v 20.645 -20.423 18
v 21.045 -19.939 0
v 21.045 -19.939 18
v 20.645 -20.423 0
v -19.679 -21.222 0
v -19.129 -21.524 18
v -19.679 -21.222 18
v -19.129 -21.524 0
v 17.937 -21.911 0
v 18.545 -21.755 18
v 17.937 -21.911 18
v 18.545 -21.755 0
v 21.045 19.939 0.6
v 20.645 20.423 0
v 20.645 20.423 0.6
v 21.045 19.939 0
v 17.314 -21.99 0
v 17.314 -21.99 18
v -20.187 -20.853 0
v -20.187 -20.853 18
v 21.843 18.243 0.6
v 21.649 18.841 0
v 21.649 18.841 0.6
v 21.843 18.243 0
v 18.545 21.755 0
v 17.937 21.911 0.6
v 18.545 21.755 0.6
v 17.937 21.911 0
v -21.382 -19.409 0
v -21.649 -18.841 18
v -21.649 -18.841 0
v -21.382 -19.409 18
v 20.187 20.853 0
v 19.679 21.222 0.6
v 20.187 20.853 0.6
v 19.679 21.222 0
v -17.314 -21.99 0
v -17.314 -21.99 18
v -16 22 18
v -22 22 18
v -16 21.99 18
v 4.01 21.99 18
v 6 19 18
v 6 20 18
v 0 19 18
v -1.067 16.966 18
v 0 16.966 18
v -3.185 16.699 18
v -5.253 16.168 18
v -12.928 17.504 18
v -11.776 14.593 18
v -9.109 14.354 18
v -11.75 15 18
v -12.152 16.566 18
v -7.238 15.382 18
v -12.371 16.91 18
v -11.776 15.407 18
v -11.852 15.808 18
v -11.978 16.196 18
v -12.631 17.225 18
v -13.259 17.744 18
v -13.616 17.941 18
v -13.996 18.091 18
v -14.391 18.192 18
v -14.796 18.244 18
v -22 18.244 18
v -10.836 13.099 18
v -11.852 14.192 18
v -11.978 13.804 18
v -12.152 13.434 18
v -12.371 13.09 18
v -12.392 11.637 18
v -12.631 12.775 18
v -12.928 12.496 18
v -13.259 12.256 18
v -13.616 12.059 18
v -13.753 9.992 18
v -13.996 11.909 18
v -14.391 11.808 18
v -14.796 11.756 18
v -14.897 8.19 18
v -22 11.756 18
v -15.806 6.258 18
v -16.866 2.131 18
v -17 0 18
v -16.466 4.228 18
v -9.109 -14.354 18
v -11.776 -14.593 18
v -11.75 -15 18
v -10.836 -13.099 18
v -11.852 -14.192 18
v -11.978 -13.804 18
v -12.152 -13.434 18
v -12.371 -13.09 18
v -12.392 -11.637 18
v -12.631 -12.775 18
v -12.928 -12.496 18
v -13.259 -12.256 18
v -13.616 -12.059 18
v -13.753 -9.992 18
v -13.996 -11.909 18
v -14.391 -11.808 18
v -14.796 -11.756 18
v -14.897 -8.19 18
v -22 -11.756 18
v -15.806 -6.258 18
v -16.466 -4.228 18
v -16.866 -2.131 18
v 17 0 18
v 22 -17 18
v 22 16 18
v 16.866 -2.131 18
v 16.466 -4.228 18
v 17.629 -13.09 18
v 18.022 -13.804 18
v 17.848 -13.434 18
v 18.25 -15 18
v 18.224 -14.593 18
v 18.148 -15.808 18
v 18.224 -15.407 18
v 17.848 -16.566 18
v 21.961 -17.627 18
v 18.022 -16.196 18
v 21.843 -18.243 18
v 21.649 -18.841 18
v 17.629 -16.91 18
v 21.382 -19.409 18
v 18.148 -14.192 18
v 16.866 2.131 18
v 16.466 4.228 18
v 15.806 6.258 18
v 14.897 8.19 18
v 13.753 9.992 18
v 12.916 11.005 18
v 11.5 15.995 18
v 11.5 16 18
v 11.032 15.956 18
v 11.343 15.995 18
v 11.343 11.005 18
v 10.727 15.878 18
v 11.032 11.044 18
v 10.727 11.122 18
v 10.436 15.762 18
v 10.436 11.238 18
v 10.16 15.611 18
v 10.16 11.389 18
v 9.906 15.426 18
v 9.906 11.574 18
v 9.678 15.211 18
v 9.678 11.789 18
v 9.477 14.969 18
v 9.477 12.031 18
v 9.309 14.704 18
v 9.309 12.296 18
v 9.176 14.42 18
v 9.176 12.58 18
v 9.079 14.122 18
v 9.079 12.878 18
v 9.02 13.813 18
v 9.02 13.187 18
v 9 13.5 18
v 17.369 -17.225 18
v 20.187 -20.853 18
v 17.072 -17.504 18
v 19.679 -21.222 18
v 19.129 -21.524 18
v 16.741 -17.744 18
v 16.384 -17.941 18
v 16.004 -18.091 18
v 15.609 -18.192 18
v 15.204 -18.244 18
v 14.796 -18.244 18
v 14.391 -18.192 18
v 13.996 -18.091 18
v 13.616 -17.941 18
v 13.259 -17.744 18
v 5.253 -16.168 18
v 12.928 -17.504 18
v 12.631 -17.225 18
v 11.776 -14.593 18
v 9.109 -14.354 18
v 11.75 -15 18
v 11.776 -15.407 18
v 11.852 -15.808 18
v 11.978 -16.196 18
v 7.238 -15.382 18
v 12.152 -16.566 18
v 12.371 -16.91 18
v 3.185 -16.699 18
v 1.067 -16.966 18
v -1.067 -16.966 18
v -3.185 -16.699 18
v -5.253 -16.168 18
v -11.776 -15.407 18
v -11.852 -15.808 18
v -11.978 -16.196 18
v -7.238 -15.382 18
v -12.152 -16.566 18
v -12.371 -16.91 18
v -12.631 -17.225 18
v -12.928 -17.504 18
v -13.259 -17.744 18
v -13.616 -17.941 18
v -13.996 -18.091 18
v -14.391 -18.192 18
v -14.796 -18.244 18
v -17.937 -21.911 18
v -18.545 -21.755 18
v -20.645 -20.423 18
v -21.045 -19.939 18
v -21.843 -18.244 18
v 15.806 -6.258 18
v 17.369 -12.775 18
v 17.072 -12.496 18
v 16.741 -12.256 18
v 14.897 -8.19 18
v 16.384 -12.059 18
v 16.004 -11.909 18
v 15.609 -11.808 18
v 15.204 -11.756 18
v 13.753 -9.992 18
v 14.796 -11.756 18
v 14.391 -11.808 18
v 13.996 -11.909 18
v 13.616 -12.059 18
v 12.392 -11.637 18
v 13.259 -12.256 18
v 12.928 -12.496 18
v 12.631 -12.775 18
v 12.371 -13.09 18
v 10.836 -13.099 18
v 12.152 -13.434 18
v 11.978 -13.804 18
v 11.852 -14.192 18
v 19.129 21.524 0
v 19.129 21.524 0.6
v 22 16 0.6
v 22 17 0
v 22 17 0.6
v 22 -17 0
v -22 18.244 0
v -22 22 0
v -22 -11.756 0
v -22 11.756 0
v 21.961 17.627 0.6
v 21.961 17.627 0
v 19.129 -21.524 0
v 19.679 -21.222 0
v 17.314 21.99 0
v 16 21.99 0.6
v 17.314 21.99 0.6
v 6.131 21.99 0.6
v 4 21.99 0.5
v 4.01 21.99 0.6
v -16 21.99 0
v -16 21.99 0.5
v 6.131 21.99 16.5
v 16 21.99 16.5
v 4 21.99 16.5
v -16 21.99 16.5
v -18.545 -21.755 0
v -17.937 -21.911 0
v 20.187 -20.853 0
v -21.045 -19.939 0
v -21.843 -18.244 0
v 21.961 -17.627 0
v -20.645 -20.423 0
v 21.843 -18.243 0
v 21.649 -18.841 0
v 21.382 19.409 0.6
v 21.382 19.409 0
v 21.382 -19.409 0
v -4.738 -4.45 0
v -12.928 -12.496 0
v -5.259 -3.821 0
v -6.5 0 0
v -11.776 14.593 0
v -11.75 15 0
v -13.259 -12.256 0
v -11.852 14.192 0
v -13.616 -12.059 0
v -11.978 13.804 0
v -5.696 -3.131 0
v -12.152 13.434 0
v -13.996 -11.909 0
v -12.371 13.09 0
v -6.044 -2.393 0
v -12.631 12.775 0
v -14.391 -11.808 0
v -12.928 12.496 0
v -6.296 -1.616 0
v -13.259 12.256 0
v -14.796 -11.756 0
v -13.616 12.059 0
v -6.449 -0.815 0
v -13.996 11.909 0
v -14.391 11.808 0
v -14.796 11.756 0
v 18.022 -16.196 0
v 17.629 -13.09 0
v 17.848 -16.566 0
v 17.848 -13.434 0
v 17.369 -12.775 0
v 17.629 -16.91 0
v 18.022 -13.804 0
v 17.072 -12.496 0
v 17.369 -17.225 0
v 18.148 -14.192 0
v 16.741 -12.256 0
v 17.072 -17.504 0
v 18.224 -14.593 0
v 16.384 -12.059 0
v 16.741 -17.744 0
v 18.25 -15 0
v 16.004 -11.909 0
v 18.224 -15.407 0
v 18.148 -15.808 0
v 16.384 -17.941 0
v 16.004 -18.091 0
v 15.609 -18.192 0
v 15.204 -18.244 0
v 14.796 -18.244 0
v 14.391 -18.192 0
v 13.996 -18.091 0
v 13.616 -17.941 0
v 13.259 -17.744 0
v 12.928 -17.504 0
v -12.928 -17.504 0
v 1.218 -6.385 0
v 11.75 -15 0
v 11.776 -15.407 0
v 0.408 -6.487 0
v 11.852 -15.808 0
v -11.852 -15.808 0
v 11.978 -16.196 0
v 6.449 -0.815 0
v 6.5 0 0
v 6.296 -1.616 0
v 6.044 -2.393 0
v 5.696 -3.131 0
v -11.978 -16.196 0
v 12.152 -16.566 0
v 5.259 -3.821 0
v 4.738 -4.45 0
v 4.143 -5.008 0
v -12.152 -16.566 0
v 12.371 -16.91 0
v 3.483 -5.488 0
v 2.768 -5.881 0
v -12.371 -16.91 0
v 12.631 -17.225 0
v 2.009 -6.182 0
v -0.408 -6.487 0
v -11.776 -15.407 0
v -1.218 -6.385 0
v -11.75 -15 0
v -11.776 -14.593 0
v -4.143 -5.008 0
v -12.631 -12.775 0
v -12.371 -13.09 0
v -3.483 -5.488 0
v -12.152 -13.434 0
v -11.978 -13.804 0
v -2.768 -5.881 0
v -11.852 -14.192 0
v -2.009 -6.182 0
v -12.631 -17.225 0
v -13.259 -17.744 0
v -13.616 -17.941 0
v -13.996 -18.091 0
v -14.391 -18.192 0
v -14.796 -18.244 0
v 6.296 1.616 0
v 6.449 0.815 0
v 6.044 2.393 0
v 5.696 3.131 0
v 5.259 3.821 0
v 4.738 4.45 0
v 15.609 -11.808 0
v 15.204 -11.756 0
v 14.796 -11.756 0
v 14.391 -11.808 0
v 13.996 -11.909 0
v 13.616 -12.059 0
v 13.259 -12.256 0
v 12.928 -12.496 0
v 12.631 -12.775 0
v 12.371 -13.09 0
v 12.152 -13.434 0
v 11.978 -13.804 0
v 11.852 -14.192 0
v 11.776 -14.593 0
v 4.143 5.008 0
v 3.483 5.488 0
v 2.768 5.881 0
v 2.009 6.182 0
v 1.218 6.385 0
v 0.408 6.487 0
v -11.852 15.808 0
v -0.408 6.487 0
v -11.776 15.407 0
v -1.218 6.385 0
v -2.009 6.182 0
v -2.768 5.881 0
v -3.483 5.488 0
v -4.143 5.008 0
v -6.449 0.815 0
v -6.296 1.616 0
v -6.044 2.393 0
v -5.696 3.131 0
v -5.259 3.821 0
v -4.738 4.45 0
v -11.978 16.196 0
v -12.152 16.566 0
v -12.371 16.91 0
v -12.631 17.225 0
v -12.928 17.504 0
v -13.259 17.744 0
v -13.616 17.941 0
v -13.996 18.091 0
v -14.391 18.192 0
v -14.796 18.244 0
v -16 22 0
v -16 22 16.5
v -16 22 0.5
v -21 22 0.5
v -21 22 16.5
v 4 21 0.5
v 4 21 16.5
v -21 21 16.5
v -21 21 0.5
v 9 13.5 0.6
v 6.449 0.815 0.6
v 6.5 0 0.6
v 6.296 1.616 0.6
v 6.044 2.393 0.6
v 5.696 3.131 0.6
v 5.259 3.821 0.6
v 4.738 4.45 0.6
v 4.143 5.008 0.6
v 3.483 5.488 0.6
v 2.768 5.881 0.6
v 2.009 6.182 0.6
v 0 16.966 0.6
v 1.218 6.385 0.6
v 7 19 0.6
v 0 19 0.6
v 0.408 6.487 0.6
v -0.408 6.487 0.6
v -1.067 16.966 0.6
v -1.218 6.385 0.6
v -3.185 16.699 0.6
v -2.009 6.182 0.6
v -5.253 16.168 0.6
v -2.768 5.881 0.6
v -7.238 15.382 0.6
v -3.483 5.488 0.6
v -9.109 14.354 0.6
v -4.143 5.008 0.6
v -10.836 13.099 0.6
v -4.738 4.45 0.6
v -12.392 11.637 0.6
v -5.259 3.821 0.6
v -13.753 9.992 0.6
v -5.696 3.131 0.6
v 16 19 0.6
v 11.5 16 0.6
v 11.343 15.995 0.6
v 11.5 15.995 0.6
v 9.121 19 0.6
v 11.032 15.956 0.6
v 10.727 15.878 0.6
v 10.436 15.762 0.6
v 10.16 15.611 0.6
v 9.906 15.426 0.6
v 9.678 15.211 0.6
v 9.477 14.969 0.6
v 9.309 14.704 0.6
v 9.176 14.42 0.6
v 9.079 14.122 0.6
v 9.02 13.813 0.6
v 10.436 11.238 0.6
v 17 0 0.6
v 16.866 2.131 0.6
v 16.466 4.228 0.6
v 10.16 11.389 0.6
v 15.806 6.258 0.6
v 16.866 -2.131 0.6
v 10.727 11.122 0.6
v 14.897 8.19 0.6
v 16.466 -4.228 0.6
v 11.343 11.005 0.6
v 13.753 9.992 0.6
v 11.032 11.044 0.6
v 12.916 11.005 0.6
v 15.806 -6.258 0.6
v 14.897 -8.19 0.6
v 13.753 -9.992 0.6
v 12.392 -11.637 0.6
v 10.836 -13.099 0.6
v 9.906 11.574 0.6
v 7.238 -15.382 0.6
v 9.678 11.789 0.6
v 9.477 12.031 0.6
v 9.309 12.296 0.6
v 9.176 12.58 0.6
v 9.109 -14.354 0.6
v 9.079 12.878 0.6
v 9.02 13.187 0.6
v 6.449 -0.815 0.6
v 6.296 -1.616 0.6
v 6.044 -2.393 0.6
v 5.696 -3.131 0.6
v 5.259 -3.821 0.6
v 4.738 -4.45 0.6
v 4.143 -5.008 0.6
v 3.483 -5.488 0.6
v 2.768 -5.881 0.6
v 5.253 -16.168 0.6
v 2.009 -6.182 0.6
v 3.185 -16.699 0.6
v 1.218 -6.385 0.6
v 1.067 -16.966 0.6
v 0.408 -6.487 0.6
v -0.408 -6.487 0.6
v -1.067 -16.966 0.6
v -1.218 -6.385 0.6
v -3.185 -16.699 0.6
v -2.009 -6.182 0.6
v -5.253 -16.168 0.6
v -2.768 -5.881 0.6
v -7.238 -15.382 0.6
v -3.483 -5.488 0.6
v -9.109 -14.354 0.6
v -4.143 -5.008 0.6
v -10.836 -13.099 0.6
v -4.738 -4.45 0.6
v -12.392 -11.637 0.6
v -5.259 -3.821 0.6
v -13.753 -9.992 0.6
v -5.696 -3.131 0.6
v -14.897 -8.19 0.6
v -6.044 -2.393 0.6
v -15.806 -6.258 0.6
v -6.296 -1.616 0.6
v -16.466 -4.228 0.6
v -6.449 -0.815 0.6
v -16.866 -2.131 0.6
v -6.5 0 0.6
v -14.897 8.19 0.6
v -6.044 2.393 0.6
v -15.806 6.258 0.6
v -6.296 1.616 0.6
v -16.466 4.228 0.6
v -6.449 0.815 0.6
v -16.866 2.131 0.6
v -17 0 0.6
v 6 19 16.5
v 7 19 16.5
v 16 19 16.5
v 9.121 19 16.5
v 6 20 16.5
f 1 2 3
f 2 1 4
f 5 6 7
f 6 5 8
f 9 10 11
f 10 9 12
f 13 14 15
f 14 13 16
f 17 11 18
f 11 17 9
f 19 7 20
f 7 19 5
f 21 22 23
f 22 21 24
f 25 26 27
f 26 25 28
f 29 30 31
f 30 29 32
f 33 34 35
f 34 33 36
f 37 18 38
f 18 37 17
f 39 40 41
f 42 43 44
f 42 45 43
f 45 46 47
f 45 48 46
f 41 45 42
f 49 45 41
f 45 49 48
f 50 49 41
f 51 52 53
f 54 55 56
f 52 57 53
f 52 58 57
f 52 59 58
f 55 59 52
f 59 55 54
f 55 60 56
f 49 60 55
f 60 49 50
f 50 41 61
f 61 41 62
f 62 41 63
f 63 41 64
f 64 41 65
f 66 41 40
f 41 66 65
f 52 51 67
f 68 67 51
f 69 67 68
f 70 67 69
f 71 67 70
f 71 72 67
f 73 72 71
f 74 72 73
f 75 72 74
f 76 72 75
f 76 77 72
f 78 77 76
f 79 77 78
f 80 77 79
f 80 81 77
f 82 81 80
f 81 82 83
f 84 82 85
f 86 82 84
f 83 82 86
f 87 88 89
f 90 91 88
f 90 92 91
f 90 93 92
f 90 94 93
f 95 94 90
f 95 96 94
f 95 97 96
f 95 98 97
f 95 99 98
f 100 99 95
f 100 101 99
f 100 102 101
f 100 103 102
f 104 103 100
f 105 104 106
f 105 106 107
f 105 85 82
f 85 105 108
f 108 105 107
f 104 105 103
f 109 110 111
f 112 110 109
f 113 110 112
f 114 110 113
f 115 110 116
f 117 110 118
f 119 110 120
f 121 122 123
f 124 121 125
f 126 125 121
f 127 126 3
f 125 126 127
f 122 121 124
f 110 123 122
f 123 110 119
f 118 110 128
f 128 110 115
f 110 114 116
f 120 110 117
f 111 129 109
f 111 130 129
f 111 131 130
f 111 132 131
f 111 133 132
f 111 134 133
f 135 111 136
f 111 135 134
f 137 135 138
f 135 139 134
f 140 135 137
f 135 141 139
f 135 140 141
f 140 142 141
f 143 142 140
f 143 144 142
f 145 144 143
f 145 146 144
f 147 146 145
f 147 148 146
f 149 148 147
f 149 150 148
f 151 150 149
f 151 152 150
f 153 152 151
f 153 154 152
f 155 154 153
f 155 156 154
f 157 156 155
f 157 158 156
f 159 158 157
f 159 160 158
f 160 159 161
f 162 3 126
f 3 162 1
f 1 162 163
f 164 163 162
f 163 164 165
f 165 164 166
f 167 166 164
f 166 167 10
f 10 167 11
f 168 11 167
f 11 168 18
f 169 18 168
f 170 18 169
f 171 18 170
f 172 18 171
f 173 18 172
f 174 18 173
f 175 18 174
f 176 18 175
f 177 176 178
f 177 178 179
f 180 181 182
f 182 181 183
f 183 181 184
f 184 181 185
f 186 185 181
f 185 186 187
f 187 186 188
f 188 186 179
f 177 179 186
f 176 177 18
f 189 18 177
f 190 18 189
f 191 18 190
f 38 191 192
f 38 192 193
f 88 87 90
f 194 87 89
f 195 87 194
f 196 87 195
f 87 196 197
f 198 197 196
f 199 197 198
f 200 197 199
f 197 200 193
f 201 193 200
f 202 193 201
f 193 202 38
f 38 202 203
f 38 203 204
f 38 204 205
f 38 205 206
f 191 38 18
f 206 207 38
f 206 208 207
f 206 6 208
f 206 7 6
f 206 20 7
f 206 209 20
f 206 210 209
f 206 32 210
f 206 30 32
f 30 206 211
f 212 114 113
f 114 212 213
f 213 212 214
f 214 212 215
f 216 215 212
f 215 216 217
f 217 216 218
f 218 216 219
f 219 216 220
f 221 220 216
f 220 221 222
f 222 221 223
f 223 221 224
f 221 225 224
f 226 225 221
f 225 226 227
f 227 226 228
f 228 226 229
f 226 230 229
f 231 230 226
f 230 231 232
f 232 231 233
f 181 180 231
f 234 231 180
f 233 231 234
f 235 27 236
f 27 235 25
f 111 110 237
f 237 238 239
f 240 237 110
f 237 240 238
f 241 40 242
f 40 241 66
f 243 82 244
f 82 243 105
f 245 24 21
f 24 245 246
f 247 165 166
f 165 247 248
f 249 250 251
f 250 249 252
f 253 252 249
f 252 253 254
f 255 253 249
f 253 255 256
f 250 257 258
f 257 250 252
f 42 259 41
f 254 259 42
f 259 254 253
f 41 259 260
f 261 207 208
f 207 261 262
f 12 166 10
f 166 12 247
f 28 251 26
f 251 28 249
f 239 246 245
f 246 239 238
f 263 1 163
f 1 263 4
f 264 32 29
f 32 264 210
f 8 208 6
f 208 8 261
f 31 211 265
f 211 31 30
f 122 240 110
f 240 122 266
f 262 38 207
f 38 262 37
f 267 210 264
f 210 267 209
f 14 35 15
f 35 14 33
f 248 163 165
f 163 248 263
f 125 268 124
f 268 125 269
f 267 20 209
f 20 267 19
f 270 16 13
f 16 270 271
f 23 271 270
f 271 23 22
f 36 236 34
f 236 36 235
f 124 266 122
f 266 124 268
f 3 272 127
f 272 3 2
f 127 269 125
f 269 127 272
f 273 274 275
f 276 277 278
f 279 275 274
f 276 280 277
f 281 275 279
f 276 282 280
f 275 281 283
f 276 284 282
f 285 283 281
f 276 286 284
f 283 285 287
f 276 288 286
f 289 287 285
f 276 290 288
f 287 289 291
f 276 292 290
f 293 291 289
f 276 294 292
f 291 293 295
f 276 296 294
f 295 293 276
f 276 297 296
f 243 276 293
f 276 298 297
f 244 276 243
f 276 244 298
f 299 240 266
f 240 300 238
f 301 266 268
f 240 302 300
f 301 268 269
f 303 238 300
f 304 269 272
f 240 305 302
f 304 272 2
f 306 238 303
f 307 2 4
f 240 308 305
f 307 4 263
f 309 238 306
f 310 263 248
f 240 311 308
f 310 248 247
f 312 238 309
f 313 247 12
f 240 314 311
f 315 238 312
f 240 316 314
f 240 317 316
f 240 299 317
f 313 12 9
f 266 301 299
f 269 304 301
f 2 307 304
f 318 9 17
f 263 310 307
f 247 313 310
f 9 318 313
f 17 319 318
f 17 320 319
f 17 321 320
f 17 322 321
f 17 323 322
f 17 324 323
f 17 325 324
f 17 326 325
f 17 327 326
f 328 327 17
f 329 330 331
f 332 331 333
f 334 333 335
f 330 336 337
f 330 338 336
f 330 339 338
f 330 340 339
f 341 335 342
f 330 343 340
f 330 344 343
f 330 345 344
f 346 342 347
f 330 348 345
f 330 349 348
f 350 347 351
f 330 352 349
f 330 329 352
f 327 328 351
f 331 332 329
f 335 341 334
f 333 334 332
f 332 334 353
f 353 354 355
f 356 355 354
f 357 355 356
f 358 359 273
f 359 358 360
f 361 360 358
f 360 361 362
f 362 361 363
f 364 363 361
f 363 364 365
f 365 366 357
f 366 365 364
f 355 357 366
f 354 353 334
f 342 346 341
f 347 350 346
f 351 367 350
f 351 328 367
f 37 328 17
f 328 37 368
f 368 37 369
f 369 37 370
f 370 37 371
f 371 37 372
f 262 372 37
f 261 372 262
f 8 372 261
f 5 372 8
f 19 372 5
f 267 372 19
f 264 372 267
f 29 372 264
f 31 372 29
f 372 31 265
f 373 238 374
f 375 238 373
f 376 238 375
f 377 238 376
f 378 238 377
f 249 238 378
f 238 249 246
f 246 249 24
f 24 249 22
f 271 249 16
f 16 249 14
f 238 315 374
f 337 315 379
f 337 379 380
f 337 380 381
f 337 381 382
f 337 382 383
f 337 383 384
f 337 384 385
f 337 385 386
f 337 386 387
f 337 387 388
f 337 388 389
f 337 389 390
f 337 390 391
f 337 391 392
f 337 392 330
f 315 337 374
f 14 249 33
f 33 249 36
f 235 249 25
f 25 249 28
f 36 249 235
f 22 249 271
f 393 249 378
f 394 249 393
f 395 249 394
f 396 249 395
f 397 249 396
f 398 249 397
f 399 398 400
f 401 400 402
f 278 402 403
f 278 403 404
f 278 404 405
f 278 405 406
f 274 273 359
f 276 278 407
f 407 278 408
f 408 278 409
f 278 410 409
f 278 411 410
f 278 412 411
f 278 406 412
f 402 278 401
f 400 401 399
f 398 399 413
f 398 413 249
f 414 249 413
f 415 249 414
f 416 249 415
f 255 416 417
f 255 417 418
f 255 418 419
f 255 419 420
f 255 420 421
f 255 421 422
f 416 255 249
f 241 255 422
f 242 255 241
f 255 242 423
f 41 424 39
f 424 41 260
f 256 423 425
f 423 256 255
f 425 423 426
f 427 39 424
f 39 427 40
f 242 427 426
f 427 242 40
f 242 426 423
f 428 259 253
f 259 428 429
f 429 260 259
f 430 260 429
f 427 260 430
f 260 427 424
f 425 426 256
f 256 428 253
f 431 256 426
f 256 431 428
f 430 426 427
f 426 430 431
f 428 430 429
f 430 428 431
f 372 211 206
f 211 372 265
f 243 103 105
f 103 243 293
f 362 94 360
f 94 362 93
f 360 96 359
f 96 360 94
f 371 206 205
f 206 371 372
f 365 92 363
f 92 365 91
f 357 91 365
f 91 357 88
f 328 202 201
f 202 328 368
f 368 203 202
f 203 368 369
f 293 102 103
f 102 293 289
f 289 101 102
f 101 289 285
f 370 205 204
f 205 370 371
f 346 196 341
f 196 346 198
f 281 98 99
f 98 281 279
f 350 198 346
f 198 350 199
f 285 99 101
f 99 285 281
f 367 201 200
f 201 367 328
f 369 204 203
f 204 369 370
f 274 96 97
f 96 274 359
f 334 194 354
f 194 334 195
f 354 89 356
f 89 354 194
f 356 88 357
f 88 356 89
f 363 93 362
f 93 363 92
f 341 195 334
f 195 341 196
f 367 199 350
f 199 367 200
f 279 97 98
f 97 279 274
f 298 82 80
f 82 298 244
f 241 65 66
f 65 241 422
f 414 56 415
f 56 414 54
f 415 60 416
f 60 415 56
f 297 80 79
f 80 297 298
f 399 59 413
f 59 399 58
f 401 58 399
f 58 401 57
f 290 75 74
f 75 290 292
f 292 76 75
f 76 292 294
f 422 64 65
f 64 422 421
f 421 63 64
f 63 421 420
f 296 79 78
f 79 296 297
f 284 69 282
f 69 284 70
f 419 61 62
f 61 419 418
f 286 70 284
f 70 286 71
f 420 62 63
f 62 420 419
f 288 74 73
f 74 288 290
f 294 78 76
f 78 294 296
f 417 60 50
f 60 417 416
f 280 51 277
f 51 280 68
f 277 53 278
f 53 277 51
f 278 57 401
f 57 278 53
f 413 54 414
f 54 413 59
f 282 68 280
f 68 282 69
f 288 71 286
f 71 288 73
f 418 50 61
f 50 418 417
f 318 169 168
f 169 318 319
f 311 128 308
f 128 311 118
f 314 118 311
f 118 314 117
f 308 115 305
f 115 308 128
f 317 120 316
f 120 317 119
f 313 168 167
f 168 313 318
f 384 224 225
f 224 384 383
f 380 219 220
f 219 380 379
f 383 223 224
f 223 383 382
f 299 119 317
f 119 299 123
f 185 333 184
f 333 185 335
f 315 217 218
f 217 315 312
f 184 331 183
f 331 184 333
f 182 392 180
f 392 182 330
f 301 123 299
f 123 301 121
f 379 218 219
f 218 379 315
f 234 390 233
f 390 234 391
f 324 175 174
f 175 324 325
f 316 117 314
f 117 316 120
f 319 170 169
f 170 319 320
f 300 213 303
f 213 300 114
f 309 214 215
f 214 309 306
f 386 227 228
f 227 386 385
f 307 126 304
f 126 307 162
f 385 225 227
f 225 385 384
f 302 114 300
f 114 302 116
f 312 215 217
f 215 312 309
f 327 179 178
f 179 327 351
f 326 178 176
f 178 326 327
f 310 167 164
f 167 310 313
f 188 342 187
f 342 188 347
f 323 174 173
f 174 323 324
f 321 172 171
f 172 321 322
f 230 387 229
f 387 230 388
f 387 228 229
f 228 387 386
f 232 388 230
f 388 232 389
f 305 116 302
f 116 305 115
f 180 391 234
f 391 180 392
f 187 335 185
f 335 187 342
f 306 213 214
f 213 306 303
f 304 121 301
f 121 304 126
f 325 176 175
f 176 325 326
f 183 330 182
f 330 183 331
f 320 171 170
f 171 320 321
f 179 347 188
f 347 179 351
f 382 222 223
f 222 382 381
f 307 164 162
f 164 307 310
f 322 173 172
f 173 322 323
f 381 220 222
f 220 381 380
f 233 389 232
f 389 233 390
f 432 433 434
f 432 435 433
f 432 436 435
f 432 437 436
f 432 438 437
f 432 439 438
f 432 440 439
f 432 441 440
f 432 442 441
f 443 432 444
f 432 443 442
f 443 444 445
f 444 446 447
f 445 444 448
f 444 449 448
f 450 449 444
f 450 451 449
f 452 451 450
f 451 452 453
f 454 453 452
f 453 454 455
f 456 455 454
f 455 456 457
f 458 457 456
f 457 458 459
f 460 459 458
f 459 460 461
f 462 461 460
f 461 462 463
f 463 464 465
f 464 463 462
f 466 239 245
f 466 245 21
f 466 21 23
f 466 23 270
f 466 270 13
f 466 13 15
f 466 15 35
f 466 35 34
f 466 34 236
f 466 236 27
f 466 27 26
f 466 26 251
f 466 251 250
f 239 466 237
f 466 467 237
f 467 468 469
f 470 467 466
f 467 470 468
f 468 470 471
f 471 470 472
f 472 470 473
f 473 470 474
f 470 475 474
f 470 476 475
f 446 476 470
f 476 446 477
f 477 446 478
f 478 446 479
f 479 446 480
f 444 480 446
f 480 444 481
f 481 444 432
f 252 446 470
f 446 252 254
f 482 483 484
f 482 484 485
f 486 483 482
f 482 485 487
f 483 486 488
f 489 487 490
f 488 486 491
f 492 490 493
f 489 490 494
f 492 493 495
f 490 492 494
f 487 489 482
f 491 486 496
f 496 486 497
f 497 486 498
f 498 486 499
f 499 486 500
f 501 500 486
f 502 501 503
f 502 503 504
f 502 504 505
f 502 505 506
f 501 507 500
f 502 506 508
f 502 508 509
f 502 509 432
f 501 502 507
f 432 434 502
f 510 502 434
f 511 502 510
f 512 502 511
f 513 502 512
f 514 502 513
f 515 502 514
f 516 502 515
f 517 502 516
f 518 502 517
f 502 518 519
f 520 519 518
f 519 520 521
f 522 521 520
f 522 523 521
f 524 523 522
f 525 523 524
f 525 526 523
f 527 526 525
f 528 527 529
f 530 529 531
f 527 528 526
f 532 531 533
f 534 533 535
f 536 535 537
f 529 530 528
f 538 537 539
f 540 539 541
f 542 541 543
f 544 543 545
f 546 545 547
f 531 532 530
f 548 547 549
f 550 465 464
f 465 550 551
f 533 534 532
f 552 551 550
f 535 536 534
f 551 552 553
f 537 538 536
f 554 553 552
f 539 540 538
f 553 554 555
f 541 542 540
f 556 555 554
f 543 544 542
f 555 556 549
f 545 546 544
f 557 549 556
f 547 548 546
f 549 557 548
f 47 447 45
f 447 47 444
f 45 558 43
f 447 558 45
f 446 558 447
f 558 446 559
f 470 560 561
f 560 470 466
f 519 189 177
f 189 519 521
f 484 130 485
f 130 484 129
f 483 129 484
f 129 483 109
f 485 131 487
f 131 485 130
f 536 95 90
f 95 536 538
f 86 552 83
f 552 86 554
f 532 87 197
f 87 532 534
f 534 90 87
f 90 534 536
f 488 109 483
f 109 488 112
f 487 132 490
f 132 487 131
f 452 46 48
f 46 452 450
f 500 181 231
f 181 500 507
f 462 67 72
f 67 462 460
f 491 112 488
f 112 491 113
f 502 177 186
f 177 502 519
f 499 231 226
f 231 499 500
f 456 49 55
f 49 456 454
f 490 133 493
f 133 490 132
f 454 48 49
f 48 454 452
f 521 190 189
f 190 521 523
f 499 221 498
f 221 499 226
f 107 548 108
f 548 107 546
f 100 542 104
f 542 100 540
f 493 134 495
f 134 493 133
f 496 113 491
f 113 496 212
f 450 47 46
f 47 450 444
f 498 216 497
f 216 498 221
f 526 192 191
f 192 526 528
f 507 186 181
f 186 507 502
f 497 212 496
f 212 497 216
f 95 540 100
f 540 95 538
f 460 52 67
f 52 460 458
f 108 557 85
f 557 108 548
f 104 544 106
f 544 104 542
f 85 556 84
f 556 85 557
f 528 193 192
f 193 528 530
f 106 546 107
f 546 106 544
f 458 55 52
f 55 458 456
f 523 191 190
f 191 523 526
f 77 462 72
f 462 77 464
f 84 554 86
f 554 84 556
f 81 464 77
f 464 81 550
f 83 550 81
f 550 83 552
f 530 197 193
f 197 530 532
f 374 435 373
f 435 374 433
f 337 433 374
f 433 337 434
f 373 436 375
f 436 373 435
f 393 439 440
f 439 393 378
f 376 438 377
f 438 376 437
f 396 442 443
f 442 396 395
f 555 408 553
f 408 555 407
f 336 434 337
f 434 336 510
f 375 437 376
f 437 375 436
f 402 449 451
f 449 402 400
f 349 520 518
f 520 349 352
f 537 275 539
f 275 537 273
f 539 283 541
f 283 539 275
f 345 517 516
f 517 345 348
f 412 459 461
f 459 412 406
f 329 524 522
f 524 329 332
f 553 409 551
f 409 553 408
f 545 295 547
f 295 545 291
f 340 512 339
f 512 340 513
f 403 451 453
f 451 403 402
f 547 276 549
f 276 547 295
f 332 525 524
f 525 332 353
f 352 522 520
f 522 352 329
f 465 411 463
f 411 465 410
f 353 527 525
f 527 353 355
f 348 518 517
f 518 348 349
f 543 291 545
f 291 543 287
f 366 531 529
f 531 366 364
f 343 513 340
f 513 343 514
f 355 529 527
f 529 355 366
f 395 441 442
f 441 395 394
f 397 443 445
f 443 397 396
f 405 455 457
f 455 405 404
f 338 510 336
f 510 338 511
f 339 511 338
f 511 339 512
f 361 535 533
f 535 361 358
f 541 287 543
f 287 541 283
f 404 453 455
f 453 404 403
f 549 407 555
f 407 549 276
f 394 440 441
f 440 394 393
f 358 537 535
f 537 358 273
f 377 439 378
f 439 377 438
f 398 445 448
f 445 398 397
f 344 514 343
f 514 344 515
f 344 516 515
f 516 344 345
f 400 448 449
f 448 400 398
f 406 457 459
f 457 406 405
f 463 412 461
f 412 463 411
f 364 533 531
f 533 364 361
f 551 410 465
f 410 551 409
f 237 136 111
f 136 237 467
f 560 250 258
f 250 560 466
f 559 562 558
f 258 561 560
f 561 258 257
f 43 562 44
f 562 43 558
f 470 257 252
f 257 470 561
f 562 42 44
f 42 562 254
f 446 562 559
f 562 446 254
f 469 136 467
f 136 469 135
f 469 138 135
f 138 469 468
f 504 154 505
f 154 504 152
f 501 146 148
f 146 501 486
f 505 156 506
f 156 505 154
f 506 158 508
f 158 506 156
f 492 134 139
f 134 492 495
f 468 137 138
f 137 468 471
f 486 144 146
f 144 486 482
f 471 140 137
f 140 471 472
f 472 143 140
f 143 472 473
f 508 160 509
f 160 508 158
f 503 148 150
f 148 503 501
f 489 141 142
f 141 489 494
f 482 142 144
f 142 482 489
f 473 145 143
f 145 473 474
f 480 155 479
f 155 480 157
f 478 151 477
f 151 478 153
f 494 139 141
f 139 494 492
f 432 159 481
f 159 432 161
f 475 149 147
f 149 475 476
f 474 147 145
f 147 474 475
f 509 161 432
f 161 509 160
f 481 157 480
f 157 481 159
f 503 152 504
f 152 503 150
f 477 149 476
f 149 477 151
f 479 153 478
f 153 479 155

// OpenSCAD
$fn = 50;


union() {
	difference() {
		union() {
			translate(v = [0, 0, 0]) {
				rotate(a = [0, 0, 0]) {
					hull() {
						translate(v = [-17.0000000000, 17.0000000000, 0]) {
							rotate(a = [0, 0, 0]) {
								translate(v = [0, 0, 0]) {
									rotate(a = [0, 0, 0]) {
										cylinder(h = 18, r = 5);
									}
								}
							}
						}
						translate(v = [17.0000000000, 17.0000000000, 0]) {
							rotate(a = [0, 0, 0]) {
								translate(v = [0, 0, 0]) {
									rotate(a = [0, 0, 0]) {
										cylinder(h = 18, r = 5);
									}
								}
							}
						}
						translate(v = [-17.0000000000, -17.0000000000, 0]) {
							rotate(a = [0, 0, 0]) {
								translate(v = [0, 0, 0]) {
									rotate(a = [0, 0, 0]) {
										cylinder(h = 18, r = 5);
									}
								}
							}
						}
						translate(v = [17.0000000000, -17.0000000000, 0]) {
							rotate(a = [0, 0, 0]) {
								translate(v = [0, 0, 0]) {
									rotate(a = [0, 0, 0]) {
										cylinder(h = 18, r = 5);
									}
								}
							}
						}
					}
				}
			}
			translate(v = [-22.0000000000, 16.0000000000, 0]) {
				rotate(a = [0, 0, 0]) {
					cube(size = [6, 6, 18]);
				}
			}
		}
		union() {
			#translate(v = [-21.0000000000, 21.0000000000, 0.5000000000]) {
				rotate(a = [0, 0, 0]) {
					cube(size = [25, 1, 16]);
				}
			}
			translate(v = [-22.5000000000, -15.0000000000, -125]) {
				rotate(a = [0, 0, 0]) {
					hull() {
						translate(v = [7.5000000000, 0, 0]) {
							rotate(a = [0, 0, 0]) {
								translate(v = [0, 0, 0]) {
									rotate(a = [0, 0, 0]) {
										cylinder(h = 250, r = 3.2500000000);
									}
								}
							}
						}
						translate(v = [-7.5000000000, 0, 0]) {
							rotate(a = [0, 0, 0]) {
								translate(v = [0, 0, 0]) {
									rotate(a = [0, 0, 0]) {
										cylinder(h = 250, r = 3.2500000000);
									}
								}
							}
						}
					}
				}
			}
			translate(v = [-22.5000000000, 15.0000000000, -125]) {
				rotate(a = [0, 0, 0]) {
					hull() {
						translate(v = [7.5000000000, 0, 0]) {
							rotate(a = [0, 0, 0]) {
								translate(v = [0, 0, 0]) {
									rotate(a = [0, 0, 0]) {
										cylinder(h = 250, r = 3.2500000000);
									}
								}
							}
						}
						translate(v = [-7.5000000000, 0, 0]) {
							rotate(a = [0, 0, 0]) {
								translate(v = [0, 0, 0]) {
									rotate(a = [0, 0, 0]) {
										cylinder(h = 250, r = 3.2500000000);
									}
								}
							}
						}
					}
				}
			}
			translate(v = [15.0000000000, -15.0000000000, -125.0000000000]) {
				rotate(a = [0, 0, 0]) {
					cylinder(h = 250, r = 3.2500000000);
				}
			}
			translate(v = [0.0000000000, 11.0000000000, 0.6000000000]) {
				rotate(a = [0, 0, 0]) {
					cube(size = [11, 8, 20.4000000000]);
				}
			}
			translate(v = [0, 0, 0.6000000000]) {
				rotate(a = [0, 0, 0]) {
					cylinder(h = 20.4000000000, r = 17.0000000000);
				}
			}
			translate(v = [0, 0, -9.0000000000]) {
				rotate(a = [0, 0, 0]) {
					cylinder(h = 18, r = 6.5000000000);
				}
			}
			translate(v = [0.0000000000, 16.0000000000, 0.6000000000]) {
				rotate(a = [0, 0, 0]) {
					cube(size = [22.0000000000, 3, 20.4000000000]);
				}
			}
			translate(v = [16.0000000000, 16.0000000000, 0.6000000000]) {
				rotate(a = [0, 0, 0]) {
					cube(size = [6, 6, 20.4000000000]);
				}
			}
			translate(v = [6.0000000000, 16.0000000000, 16.5000000000]) {
				rotate(a = [0, 0, 0]) {
					cube(size = [16, 6, 1.5000000000]);
				}
			}
			translate(v = [3.2500000000, 22.7500000000, 0.6000000000]) {
				rotate(a = [0, 0, -45]) {
					cube(size = [7.5000000000, 1.5000000000, 20.4000000000]);
				}
			}
			translate(v = [2.5000000000, 11.0000000000, 0.6000000000]) {
				rotate(a = [0, 0, 0]) {
					cube(size = [9.0000000000, 5, 17.4000000000]);
				}
			}
		}
	}
	union() {
		translate(v = [14, 13.5000000000, 0]) {
			rotate(a = [0, 0, 0]) {
				hull() {
					translate(v = [2.5000000000, 0, 0]) {
						rotate(a = [0, 0, 0]) {
							#translate(v = [0, 0, 0]) {
								rotate(a = [0, 0, 0]) {
									cylinder(h = 18, r = 2.5000000000);
								}
							}
						}
					}
					translate(v = [-2.5000000000, 0, 0]) {
						rotate(a = [0, 0, 0]) {
							#translate(v = [0, 0, 0]) {
								rotate(a = [0, 0, 0]) {
									cylinder(h = 18, r = 2.5000000000);
								}
							}
						}
					}
				}
			}
		}
	}
}
